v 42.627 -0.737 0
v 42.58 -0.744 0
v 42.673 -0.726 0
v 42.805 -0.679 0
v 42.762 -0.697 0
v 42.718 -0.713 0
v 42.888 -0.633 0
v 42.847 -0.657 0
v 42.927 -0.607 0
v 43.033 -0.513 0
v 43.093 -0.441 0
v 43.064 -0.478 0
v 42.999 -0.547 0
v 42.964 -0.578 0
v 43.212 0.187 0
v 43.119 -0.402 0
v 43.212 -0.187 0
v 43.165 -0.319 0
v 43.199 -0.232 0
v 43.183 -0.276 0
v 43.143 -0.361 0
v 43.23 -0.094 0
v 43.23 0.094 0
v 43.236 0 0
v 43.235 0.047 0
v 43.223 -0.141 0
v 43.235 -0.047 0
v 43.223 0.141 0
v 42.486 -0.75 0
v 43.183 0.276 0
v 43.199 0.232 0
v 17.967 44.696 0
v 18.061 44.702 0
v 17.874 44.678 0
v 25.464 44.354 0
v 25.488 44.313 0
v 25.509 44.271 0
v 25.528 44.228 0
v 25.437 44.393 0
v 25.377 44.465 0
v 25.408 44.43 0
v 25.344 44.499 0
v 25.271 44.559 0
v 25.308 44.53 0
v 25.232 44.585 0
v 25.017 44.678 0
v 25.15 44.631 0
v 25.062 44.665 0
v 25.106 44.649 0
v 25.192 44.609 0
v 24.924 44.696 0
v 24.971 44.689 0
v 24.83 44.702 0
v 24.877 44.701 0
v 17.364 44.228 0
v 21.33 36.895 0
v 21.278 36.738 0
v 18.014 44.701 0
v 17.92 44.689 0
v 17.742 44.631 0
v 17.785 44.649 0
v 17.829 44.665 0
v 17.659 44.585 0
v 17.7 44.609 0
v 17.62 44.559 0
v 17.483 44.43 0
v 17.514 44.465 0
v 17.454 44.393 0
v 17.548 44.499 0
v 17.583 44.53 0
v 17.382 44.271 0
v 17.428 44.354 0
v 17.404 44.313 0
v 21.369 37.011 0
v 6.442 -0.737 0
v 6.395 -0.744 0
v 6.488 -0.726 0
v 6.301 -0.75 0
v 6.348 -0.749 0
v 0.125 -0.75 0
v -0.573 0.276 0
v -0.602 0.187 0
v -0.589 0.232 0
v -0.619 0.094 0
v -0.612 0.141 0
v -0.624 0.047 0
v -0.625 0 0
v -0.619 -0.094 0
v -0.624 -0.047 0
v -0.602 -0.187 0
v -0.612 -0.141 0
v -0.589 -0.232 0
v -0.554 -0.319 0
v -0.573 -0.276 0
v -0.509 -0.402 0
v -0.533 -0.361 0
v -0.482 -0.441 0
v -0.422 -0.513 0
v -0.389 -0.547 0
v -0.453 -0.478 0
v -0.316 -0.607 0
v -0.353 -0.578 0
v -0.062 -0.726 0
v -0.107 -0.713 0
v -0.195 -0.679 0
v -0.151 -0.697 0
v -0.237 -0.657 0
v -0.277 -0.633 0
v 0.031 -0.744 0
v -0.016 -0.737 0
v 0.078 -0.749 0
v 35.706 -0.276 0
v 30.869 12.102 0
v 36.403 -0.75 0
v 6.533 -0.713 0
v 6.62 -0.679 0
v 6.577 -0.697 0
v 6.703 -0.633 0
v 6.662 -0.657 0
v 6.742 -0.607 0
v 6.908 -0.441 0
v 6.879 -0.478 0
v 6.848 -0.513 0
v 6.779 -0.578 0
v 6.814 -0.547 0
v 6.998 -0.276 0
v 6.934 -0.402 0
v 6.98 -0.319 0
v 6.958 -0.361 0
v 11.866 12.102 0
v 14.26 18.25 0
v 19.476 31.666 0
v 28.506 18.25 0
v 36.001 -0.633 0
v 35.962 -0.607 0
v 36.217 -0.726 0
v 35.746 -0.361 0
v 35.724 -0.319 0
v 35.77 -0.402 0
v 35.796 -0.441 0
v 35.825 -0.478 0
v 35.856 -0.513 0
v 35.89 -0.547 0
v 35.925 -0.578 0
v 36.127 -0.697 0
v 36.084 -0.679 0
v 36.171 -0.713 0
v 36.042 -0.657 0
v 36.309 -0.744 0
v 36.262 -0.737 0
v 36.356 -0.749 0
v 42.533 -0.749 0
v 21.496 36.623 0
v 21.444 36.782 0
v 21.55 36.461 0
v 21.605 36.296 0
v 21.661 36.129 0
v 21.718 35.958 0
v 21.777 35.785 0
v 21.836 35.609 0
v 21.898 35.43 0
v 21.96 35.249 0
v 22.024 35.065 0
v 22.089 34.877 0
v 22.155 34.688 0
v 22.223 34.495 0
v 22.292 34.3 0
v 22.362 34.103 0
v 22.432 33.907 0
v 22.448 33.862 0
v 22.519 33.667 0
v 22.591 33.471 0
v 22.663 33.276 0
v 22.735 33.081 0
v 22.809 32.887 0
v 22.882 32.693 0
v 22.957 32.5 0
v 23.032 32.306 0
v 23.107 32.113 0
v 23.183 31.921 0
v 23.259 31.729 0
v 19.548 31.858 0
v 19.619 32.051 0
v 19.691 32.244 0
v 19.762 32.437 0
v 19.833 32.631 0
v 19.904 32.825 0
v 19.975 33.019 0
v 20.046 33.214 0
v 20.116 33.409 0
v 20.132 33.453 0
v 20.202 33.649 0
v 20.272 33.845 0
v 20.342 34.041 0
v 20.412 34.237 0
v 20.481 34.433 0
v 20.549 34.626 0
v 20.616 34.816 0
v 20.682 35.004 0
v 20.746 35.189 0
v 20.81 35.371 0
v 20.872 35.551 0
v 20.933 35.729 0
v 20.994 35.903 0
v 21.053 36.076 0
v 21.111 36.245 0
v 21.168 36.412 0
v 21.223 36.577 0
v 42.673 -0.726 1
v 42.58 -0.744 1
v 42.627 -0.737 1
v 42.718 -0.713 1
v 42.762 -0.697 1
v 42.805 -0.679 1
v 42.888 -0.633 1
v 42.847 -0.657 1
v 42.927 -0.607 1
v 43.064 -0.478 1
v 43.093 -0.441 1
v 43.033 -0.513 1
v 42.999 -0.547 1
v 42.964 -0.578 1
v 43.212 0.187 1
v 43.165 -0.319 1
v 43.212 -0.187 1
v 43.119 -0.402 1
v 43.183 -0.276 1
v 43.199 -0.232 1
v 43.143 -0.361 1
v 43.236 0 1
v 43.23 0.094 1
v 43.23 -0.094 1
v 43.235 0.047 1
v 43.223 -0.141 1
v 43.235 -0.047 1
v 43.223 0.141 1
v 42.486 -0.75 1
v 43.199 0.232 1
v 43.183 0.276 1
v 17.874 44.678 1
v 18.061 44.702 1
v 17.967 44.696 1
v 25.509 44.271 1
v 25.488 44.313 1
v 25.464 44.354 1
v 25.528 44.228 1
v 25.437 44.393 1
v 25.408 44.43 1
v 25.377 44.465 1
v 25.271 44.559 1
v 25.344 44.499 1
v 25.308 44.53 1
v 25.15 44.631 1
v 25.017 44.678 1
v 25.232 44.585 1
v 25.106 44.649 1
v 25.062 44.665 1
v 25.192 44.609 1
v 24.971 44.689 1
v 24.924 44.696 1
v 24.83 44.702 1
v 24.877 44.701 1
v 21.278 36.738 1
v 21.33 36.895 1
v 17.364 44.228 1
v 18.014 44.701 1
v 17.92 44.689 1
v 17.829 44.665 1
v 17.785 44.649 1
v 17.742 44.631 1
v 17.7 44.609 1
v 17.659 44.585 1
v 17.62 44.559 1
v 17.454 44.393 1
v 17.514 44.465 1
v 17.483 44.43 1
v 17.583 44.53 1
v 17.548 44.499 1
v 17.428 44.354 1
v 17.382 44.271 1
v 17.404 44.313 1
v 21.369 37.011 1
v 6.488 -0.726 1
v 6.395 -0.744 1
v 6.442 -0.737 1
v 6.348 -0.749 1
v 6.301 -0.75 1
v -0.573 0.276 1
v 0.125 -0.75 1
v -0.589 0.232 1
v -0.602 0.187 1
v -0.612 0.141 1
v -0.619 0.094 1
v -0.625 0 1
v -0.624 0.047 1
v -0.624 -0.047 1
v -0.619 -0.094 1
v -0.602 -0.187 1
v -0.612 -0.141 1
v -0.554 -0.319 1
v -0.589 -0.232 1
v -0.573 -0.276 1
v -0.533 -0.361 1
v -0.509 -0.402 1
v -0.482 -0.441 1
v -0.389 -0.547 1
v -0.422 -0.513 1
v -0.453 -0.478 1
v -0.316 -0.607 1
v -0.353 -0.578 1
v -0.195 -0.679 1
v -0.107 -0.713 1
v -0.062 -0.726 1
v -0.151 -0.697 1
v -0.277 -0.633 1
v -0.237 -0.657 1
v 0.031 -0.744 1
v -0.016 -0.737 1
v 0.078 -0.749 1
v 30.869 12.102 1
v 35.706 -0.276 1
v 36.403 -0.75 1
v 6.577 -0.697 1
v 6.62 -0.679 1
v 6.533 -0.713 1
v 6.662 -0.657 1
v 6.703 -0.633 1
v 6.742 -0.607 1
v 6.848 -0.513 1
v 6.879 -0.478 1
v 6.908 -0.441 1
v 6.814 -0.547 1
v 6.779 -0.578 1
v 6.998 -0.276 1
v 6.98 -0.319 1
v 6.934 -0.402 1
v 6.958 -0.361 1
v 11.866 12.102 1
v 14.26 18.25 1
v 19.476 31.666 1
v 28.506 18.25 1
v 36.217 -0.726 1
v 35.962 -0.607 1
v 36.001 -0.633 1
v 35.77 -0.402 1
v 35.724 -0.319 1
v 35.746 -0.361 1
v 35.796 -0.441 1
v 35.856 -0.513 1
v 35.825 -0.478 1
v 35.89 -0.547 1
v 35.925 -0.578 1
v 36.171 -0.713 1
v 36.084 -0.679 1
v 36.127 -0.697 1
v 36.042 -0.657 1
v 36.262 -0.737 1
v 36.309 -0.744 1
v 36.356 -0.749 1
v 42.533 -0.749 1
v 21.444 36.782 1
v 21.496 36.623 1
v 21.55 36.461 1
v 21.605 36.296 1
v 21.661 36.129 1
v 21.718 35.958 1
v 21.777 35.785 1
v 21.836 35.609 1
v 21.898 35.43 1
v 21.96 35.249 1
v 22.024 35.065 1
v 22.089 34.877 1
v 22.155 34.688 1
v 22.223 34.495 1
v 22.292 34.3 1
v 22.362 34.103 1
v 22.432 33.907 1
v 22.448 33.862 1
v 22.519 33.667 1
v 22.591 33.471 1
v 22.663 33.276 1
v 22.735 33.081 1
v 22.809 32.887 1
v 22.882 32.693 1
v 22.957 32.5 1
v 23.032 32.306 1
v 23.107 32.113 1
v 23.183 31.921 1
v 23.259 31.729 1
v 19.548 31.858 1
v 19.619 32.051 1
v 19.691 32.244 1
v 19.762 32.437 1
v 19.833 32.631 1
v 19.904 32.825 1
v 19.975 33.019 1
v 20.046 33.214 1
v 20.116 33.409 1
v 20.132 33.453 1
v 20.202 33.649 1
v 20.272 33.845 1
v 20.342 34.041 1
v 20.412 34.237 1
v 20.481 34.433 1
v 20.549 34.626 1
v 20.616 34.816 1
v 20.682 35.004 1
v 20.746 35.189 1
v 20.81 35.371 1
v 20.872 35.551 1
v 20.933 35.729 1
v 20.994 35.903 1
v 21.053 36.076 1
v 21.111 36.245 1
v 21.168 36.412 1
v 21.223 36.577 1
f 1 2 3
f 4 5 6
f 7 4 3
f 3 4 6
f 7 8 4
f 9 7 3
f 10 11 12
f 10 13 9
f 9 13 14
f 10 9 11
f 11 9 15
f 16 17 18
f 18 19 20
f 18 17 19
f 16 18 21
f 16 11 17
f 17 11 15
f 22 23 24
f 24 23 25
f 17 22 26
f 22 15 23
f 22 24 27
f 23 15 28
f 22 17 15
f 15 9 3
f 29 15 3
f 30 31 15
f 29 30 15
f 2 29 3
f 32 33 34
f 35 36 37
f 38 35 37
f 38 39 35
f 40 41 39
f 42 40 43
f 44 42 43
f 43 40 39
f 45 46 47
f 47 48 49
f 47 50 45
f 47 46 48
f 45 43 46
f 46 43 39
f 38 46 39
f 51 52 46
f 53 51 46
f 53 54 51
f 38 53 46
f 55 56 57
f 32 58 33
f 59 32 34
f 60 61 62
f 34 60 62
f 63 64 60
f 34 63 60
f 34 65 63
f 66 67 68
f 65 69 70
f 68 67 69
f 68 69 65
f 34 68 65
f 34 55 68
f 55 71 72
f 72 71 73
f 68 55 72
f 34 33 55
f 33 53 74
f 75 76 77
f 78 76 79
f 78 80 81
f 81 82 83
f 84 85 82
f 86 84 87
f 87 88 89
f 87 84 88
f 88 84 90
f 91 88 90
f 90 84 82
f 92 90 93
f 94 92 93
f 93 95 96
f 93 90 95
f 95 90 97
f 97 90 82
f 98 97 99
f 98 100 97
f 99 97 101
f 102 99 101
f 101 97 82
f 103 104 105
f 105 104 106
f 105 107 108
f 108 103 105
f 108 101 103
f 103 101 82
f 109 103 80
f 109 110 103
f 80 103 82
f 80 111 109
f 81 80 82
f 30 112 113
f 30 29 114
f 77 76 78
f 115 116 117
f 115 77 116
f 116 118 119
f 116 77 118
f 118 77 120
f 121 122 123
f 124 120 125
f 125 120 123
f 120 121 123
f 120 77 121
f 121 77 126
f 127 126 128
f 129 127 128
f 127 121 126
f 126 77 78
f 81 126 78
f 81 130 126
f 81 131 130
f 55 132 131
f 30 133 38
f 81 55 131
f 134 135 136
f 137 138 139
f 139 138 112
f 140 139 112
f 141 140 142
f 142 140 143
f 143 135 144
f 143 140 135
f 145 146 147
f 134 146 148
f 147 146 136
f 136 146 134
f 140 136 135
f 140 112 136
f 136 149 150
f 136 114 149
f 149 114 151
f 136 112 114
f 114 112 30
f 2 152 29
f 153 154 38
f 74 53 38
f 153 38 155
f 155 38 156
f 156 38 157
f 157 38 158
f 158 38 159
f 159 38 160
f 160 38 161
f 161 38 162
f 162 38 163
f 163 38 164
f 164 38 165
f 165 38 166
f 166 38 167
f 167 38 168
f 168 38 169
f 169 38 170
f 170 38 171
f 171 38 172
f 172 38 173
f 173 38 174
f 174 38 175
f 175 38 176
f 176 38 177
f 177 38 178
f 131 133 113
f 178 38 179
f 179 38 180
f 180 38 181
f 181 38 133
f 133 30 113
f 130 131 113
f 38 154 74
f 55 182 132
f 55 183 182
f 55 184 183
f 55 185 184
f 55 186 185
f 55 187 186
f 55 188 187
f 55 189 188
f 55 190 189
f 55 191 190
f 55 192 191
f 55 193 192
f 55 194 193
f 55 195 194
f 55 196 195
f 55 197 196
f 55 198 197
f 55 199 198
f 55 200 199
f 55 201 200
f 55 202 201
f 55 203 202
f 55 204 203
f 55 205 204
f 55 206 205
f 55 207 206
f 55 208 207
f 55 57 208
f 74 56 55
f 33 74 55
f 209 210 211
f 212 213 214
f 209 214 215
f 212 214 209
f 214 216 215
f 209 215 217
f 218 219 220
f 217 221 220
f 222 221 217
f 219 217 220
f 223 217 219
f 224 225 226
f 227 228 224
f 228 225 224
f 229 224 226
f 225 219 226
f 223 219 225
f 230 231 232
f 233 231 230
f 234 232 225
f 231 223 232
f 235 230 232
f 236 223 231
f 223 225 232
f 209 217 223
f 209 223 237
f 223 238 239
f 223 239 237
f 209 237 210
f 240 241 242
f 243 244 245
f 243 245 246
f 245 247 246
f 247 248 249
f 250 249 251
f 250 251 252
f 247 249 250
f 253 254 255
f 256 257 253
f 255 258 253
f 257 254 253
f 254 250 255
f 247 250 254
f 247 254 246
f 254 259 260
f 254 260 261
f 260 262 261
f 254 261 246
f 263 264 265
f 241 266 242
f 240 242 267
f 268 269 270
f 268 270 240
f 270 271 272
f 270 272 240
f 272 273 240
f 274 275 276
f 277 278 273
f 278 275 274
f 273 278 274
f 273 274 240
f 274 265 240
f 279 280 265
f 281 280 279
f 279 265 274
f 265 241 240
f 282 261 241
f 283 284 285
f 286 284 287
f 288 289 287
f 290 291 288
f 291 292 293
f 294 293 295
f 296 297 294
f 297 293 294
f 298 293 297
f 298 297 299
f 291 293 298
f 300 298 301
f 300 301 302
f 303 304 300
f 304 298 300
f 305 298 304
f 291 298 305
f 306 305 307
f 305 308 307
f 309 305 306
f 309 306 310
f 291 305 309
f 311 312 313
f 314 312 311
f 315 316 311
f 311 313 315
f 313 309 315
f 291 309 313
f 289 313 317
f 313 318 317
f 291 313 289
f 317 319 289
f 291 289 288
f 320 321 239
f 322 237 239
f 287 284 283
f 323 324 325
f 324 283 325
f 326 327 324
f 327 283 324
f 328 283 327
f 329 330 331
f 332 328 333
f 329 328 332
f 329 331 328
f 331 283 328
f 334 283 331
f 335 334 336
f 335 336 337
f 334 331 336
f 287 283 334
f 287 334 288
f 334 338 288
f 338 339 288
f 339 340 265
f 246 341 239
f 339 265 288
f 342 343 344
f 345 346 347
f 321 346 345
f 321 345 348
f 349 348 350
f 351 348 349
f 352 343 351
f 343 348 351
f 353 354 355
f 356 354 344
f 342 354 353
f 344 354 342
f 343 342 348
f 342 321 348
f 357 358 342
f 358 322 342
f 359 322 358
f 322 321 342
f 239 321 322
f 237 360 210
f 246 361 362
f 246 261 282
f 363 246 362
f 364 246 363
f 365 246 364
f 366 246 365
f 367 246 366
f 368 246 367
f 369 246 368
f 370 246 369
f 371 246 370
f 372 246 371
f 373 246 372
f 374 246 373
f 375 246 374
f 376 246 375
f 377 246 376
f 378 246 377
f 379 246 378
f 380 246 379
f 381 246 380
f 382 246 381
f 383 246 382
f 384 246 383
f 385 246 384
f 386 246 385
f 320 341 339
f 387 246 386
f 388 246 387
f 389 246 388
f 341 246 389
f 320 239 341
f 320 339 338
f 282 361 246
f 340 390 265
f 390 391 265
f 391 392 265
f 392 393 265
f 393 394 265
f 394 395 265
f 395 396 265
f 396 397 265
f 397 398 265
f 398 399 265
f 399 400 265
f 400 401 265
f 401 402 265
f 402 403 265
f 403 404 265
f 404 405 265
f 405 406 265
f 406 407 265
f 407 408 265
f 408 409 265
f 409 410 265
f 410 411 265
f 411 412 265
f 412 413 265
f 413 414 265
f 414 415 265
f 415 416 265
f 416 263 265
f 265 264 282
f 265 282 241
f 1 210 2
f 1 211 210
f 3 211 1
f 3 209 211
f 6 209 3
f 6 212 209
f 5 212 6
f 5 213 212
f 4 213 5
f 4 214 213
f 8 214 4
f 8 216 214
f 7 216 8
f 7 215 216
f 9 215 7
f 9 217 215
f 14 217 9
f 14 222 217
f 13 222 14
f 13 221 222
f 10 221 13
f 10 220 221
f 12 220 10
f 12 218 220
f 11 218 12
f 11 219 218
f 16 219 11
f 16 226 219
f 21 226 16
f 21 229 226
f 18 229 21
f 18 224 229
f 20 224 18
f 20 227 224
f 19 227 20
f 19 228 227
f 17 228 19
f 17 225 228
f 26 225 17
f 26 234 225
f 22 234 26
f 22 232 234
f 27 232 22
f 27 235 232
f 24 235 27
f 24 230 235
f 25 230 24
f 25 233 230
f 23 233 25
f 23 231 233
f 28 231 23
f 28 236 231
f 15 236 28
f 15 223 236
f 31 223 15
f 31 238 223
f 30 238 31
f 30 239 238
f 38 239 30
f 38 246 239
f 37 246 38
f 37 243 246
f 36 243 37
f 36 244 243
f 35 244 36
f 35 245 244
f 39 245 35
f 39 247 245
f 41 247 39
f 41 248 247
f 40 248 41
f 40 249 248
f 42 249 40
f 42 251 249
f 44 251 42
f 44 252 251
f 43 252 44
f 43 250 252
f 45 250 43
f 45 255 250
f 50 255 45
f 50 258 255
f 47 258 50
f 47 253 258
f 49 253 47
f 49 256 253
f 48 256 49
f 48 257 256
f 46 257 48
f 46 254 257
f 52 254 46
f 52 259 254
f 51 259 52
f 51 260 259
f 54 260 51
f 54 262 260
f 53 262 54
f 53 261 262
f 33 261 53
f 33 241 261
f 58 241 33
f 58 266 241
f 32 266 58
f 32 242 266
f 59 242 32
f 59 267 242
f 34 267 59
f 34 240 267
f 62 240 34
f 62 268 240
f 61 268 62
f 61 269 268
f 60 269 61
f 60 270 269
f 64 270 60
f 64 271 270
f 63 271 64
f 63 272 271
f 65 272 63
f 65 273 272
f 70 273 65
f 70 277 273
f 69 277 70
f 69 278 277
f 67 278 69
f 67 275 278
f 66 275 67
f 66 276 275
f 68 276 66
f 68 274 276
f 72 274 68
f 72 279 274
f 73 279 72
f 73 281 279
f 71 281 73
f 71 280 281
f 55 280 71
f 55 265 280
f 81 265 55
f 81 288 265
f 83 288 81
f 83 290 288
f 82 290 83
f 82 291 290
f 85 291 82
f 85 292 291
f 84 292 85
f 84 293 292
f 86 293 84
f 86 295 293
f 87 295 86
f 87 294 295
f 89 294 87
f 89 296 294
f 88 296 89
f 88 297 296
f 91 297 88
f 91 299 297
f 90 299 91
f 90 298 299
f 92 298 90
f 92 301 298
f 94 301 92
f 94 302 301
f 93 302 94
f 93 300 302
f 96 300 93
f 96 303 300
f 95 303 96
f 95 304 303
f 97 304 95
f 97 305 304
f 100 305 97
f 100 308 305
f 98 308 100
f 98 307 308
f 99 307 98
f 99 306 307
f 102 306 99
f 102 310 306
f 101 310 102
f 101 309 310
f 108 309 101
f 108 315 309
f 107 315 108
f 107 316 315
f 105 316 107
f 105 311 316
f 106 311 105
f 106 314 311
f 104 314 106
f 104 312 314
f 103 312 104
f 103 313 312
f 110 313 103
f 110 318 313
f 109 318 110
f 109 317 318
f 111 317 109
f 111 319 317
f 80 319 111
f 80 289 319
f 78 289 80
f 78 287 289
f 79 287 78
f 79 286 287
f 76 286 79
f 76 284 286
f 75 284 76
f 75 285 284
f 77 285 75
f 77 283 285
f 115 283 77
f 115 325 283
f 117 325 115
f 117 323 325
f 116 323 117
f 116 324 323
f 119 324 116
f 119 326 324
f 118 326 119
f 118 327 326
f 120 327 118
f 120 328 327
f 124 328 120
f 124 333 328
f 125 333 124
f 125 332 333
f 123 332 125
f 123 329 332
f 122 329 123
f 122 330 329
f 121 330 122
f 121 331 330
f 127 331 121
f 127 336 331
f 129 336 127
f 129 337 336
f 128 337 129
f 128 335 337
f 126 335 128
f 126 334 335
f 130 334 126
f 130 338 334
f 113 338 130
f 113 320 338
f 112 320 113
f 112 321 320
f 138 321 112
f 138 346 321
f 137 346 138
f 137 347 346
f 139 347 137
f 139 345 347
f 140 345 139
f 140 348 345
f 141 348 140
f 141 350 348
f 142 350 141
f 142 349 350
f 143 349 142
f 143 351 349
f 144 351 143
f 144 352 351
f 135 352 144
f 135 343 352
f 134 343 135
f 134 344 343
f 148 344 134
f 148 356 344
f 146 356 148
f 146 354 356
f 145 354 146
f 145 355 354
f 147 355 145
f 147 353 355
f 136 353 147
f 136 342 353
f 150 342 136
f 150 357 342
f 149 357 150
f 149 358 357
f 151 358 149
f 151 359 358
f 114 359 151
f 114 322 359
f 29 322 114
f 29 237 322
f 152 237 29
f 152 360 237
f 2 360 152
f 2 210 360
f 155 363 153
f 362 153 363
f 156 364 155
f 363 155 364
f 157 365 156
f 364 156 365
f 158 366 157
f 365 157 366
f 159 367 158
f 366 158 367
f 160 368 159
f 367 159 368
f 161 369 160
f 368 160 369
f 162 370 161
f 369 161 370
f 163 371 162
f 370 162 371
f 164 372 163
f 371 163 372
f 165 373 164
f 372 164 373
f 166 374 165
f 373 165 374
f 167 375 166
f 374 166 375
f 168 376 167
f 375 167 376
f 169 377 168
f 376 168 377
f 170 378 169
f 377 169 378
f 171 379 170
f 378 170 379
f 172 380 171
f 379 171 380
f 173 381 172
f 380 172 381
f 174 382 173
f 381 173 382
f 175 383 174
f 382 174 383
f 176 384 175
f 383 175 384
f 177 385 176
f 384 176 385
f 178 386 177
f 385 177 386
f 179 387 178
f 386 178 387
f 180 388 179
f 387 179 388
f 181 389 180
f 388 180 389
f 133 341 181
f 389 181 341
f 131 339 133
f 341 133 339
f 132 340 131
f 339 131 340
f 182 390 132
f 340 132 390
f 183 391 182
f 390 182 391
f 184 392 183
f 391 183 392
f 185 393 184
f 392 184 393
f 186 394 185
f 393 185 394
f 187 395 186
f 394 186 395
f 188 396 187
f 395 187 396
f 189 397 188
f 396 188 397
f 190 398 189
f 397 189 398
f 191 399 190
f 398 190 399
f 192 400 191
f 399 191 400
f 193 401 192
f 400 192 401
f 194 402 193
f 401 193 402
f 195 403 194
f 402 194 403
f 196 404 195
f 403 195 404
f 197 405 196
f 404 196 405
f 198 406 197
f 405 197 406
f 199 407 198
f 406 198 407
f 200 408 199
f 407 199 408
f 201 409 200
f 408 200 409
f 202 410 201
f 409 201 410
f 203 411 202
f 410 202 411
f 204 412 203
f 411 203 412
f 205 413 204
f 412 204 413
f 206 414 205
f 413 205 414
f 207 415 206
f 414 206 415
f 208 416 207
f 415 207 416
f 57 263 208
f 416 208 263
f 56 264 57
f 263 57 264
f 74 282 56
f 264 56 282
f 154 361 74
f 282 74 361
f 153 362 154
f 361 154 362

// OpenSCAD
// Sign front-face generator V3 - bigclivedotcom
// All variables must match the sign body sizes
letter = "A"; // Sign character to make
style = "Arial"; // See "Help" and "Font List"
size = 50; // Size of character
$fn=100; // Curve facets - higher is smoother
walls = 2; // Side wall thickness
face = 1; // Face thickness
fit = 0.5; // Slight shrink of face for easier fitting

// Don't change variables below here
sized=size-(2*walls);
linear_extrude(height=face)
minkowski() {
    text(letter,sized,style);
    circle((walls/2)-fit/2);
}
